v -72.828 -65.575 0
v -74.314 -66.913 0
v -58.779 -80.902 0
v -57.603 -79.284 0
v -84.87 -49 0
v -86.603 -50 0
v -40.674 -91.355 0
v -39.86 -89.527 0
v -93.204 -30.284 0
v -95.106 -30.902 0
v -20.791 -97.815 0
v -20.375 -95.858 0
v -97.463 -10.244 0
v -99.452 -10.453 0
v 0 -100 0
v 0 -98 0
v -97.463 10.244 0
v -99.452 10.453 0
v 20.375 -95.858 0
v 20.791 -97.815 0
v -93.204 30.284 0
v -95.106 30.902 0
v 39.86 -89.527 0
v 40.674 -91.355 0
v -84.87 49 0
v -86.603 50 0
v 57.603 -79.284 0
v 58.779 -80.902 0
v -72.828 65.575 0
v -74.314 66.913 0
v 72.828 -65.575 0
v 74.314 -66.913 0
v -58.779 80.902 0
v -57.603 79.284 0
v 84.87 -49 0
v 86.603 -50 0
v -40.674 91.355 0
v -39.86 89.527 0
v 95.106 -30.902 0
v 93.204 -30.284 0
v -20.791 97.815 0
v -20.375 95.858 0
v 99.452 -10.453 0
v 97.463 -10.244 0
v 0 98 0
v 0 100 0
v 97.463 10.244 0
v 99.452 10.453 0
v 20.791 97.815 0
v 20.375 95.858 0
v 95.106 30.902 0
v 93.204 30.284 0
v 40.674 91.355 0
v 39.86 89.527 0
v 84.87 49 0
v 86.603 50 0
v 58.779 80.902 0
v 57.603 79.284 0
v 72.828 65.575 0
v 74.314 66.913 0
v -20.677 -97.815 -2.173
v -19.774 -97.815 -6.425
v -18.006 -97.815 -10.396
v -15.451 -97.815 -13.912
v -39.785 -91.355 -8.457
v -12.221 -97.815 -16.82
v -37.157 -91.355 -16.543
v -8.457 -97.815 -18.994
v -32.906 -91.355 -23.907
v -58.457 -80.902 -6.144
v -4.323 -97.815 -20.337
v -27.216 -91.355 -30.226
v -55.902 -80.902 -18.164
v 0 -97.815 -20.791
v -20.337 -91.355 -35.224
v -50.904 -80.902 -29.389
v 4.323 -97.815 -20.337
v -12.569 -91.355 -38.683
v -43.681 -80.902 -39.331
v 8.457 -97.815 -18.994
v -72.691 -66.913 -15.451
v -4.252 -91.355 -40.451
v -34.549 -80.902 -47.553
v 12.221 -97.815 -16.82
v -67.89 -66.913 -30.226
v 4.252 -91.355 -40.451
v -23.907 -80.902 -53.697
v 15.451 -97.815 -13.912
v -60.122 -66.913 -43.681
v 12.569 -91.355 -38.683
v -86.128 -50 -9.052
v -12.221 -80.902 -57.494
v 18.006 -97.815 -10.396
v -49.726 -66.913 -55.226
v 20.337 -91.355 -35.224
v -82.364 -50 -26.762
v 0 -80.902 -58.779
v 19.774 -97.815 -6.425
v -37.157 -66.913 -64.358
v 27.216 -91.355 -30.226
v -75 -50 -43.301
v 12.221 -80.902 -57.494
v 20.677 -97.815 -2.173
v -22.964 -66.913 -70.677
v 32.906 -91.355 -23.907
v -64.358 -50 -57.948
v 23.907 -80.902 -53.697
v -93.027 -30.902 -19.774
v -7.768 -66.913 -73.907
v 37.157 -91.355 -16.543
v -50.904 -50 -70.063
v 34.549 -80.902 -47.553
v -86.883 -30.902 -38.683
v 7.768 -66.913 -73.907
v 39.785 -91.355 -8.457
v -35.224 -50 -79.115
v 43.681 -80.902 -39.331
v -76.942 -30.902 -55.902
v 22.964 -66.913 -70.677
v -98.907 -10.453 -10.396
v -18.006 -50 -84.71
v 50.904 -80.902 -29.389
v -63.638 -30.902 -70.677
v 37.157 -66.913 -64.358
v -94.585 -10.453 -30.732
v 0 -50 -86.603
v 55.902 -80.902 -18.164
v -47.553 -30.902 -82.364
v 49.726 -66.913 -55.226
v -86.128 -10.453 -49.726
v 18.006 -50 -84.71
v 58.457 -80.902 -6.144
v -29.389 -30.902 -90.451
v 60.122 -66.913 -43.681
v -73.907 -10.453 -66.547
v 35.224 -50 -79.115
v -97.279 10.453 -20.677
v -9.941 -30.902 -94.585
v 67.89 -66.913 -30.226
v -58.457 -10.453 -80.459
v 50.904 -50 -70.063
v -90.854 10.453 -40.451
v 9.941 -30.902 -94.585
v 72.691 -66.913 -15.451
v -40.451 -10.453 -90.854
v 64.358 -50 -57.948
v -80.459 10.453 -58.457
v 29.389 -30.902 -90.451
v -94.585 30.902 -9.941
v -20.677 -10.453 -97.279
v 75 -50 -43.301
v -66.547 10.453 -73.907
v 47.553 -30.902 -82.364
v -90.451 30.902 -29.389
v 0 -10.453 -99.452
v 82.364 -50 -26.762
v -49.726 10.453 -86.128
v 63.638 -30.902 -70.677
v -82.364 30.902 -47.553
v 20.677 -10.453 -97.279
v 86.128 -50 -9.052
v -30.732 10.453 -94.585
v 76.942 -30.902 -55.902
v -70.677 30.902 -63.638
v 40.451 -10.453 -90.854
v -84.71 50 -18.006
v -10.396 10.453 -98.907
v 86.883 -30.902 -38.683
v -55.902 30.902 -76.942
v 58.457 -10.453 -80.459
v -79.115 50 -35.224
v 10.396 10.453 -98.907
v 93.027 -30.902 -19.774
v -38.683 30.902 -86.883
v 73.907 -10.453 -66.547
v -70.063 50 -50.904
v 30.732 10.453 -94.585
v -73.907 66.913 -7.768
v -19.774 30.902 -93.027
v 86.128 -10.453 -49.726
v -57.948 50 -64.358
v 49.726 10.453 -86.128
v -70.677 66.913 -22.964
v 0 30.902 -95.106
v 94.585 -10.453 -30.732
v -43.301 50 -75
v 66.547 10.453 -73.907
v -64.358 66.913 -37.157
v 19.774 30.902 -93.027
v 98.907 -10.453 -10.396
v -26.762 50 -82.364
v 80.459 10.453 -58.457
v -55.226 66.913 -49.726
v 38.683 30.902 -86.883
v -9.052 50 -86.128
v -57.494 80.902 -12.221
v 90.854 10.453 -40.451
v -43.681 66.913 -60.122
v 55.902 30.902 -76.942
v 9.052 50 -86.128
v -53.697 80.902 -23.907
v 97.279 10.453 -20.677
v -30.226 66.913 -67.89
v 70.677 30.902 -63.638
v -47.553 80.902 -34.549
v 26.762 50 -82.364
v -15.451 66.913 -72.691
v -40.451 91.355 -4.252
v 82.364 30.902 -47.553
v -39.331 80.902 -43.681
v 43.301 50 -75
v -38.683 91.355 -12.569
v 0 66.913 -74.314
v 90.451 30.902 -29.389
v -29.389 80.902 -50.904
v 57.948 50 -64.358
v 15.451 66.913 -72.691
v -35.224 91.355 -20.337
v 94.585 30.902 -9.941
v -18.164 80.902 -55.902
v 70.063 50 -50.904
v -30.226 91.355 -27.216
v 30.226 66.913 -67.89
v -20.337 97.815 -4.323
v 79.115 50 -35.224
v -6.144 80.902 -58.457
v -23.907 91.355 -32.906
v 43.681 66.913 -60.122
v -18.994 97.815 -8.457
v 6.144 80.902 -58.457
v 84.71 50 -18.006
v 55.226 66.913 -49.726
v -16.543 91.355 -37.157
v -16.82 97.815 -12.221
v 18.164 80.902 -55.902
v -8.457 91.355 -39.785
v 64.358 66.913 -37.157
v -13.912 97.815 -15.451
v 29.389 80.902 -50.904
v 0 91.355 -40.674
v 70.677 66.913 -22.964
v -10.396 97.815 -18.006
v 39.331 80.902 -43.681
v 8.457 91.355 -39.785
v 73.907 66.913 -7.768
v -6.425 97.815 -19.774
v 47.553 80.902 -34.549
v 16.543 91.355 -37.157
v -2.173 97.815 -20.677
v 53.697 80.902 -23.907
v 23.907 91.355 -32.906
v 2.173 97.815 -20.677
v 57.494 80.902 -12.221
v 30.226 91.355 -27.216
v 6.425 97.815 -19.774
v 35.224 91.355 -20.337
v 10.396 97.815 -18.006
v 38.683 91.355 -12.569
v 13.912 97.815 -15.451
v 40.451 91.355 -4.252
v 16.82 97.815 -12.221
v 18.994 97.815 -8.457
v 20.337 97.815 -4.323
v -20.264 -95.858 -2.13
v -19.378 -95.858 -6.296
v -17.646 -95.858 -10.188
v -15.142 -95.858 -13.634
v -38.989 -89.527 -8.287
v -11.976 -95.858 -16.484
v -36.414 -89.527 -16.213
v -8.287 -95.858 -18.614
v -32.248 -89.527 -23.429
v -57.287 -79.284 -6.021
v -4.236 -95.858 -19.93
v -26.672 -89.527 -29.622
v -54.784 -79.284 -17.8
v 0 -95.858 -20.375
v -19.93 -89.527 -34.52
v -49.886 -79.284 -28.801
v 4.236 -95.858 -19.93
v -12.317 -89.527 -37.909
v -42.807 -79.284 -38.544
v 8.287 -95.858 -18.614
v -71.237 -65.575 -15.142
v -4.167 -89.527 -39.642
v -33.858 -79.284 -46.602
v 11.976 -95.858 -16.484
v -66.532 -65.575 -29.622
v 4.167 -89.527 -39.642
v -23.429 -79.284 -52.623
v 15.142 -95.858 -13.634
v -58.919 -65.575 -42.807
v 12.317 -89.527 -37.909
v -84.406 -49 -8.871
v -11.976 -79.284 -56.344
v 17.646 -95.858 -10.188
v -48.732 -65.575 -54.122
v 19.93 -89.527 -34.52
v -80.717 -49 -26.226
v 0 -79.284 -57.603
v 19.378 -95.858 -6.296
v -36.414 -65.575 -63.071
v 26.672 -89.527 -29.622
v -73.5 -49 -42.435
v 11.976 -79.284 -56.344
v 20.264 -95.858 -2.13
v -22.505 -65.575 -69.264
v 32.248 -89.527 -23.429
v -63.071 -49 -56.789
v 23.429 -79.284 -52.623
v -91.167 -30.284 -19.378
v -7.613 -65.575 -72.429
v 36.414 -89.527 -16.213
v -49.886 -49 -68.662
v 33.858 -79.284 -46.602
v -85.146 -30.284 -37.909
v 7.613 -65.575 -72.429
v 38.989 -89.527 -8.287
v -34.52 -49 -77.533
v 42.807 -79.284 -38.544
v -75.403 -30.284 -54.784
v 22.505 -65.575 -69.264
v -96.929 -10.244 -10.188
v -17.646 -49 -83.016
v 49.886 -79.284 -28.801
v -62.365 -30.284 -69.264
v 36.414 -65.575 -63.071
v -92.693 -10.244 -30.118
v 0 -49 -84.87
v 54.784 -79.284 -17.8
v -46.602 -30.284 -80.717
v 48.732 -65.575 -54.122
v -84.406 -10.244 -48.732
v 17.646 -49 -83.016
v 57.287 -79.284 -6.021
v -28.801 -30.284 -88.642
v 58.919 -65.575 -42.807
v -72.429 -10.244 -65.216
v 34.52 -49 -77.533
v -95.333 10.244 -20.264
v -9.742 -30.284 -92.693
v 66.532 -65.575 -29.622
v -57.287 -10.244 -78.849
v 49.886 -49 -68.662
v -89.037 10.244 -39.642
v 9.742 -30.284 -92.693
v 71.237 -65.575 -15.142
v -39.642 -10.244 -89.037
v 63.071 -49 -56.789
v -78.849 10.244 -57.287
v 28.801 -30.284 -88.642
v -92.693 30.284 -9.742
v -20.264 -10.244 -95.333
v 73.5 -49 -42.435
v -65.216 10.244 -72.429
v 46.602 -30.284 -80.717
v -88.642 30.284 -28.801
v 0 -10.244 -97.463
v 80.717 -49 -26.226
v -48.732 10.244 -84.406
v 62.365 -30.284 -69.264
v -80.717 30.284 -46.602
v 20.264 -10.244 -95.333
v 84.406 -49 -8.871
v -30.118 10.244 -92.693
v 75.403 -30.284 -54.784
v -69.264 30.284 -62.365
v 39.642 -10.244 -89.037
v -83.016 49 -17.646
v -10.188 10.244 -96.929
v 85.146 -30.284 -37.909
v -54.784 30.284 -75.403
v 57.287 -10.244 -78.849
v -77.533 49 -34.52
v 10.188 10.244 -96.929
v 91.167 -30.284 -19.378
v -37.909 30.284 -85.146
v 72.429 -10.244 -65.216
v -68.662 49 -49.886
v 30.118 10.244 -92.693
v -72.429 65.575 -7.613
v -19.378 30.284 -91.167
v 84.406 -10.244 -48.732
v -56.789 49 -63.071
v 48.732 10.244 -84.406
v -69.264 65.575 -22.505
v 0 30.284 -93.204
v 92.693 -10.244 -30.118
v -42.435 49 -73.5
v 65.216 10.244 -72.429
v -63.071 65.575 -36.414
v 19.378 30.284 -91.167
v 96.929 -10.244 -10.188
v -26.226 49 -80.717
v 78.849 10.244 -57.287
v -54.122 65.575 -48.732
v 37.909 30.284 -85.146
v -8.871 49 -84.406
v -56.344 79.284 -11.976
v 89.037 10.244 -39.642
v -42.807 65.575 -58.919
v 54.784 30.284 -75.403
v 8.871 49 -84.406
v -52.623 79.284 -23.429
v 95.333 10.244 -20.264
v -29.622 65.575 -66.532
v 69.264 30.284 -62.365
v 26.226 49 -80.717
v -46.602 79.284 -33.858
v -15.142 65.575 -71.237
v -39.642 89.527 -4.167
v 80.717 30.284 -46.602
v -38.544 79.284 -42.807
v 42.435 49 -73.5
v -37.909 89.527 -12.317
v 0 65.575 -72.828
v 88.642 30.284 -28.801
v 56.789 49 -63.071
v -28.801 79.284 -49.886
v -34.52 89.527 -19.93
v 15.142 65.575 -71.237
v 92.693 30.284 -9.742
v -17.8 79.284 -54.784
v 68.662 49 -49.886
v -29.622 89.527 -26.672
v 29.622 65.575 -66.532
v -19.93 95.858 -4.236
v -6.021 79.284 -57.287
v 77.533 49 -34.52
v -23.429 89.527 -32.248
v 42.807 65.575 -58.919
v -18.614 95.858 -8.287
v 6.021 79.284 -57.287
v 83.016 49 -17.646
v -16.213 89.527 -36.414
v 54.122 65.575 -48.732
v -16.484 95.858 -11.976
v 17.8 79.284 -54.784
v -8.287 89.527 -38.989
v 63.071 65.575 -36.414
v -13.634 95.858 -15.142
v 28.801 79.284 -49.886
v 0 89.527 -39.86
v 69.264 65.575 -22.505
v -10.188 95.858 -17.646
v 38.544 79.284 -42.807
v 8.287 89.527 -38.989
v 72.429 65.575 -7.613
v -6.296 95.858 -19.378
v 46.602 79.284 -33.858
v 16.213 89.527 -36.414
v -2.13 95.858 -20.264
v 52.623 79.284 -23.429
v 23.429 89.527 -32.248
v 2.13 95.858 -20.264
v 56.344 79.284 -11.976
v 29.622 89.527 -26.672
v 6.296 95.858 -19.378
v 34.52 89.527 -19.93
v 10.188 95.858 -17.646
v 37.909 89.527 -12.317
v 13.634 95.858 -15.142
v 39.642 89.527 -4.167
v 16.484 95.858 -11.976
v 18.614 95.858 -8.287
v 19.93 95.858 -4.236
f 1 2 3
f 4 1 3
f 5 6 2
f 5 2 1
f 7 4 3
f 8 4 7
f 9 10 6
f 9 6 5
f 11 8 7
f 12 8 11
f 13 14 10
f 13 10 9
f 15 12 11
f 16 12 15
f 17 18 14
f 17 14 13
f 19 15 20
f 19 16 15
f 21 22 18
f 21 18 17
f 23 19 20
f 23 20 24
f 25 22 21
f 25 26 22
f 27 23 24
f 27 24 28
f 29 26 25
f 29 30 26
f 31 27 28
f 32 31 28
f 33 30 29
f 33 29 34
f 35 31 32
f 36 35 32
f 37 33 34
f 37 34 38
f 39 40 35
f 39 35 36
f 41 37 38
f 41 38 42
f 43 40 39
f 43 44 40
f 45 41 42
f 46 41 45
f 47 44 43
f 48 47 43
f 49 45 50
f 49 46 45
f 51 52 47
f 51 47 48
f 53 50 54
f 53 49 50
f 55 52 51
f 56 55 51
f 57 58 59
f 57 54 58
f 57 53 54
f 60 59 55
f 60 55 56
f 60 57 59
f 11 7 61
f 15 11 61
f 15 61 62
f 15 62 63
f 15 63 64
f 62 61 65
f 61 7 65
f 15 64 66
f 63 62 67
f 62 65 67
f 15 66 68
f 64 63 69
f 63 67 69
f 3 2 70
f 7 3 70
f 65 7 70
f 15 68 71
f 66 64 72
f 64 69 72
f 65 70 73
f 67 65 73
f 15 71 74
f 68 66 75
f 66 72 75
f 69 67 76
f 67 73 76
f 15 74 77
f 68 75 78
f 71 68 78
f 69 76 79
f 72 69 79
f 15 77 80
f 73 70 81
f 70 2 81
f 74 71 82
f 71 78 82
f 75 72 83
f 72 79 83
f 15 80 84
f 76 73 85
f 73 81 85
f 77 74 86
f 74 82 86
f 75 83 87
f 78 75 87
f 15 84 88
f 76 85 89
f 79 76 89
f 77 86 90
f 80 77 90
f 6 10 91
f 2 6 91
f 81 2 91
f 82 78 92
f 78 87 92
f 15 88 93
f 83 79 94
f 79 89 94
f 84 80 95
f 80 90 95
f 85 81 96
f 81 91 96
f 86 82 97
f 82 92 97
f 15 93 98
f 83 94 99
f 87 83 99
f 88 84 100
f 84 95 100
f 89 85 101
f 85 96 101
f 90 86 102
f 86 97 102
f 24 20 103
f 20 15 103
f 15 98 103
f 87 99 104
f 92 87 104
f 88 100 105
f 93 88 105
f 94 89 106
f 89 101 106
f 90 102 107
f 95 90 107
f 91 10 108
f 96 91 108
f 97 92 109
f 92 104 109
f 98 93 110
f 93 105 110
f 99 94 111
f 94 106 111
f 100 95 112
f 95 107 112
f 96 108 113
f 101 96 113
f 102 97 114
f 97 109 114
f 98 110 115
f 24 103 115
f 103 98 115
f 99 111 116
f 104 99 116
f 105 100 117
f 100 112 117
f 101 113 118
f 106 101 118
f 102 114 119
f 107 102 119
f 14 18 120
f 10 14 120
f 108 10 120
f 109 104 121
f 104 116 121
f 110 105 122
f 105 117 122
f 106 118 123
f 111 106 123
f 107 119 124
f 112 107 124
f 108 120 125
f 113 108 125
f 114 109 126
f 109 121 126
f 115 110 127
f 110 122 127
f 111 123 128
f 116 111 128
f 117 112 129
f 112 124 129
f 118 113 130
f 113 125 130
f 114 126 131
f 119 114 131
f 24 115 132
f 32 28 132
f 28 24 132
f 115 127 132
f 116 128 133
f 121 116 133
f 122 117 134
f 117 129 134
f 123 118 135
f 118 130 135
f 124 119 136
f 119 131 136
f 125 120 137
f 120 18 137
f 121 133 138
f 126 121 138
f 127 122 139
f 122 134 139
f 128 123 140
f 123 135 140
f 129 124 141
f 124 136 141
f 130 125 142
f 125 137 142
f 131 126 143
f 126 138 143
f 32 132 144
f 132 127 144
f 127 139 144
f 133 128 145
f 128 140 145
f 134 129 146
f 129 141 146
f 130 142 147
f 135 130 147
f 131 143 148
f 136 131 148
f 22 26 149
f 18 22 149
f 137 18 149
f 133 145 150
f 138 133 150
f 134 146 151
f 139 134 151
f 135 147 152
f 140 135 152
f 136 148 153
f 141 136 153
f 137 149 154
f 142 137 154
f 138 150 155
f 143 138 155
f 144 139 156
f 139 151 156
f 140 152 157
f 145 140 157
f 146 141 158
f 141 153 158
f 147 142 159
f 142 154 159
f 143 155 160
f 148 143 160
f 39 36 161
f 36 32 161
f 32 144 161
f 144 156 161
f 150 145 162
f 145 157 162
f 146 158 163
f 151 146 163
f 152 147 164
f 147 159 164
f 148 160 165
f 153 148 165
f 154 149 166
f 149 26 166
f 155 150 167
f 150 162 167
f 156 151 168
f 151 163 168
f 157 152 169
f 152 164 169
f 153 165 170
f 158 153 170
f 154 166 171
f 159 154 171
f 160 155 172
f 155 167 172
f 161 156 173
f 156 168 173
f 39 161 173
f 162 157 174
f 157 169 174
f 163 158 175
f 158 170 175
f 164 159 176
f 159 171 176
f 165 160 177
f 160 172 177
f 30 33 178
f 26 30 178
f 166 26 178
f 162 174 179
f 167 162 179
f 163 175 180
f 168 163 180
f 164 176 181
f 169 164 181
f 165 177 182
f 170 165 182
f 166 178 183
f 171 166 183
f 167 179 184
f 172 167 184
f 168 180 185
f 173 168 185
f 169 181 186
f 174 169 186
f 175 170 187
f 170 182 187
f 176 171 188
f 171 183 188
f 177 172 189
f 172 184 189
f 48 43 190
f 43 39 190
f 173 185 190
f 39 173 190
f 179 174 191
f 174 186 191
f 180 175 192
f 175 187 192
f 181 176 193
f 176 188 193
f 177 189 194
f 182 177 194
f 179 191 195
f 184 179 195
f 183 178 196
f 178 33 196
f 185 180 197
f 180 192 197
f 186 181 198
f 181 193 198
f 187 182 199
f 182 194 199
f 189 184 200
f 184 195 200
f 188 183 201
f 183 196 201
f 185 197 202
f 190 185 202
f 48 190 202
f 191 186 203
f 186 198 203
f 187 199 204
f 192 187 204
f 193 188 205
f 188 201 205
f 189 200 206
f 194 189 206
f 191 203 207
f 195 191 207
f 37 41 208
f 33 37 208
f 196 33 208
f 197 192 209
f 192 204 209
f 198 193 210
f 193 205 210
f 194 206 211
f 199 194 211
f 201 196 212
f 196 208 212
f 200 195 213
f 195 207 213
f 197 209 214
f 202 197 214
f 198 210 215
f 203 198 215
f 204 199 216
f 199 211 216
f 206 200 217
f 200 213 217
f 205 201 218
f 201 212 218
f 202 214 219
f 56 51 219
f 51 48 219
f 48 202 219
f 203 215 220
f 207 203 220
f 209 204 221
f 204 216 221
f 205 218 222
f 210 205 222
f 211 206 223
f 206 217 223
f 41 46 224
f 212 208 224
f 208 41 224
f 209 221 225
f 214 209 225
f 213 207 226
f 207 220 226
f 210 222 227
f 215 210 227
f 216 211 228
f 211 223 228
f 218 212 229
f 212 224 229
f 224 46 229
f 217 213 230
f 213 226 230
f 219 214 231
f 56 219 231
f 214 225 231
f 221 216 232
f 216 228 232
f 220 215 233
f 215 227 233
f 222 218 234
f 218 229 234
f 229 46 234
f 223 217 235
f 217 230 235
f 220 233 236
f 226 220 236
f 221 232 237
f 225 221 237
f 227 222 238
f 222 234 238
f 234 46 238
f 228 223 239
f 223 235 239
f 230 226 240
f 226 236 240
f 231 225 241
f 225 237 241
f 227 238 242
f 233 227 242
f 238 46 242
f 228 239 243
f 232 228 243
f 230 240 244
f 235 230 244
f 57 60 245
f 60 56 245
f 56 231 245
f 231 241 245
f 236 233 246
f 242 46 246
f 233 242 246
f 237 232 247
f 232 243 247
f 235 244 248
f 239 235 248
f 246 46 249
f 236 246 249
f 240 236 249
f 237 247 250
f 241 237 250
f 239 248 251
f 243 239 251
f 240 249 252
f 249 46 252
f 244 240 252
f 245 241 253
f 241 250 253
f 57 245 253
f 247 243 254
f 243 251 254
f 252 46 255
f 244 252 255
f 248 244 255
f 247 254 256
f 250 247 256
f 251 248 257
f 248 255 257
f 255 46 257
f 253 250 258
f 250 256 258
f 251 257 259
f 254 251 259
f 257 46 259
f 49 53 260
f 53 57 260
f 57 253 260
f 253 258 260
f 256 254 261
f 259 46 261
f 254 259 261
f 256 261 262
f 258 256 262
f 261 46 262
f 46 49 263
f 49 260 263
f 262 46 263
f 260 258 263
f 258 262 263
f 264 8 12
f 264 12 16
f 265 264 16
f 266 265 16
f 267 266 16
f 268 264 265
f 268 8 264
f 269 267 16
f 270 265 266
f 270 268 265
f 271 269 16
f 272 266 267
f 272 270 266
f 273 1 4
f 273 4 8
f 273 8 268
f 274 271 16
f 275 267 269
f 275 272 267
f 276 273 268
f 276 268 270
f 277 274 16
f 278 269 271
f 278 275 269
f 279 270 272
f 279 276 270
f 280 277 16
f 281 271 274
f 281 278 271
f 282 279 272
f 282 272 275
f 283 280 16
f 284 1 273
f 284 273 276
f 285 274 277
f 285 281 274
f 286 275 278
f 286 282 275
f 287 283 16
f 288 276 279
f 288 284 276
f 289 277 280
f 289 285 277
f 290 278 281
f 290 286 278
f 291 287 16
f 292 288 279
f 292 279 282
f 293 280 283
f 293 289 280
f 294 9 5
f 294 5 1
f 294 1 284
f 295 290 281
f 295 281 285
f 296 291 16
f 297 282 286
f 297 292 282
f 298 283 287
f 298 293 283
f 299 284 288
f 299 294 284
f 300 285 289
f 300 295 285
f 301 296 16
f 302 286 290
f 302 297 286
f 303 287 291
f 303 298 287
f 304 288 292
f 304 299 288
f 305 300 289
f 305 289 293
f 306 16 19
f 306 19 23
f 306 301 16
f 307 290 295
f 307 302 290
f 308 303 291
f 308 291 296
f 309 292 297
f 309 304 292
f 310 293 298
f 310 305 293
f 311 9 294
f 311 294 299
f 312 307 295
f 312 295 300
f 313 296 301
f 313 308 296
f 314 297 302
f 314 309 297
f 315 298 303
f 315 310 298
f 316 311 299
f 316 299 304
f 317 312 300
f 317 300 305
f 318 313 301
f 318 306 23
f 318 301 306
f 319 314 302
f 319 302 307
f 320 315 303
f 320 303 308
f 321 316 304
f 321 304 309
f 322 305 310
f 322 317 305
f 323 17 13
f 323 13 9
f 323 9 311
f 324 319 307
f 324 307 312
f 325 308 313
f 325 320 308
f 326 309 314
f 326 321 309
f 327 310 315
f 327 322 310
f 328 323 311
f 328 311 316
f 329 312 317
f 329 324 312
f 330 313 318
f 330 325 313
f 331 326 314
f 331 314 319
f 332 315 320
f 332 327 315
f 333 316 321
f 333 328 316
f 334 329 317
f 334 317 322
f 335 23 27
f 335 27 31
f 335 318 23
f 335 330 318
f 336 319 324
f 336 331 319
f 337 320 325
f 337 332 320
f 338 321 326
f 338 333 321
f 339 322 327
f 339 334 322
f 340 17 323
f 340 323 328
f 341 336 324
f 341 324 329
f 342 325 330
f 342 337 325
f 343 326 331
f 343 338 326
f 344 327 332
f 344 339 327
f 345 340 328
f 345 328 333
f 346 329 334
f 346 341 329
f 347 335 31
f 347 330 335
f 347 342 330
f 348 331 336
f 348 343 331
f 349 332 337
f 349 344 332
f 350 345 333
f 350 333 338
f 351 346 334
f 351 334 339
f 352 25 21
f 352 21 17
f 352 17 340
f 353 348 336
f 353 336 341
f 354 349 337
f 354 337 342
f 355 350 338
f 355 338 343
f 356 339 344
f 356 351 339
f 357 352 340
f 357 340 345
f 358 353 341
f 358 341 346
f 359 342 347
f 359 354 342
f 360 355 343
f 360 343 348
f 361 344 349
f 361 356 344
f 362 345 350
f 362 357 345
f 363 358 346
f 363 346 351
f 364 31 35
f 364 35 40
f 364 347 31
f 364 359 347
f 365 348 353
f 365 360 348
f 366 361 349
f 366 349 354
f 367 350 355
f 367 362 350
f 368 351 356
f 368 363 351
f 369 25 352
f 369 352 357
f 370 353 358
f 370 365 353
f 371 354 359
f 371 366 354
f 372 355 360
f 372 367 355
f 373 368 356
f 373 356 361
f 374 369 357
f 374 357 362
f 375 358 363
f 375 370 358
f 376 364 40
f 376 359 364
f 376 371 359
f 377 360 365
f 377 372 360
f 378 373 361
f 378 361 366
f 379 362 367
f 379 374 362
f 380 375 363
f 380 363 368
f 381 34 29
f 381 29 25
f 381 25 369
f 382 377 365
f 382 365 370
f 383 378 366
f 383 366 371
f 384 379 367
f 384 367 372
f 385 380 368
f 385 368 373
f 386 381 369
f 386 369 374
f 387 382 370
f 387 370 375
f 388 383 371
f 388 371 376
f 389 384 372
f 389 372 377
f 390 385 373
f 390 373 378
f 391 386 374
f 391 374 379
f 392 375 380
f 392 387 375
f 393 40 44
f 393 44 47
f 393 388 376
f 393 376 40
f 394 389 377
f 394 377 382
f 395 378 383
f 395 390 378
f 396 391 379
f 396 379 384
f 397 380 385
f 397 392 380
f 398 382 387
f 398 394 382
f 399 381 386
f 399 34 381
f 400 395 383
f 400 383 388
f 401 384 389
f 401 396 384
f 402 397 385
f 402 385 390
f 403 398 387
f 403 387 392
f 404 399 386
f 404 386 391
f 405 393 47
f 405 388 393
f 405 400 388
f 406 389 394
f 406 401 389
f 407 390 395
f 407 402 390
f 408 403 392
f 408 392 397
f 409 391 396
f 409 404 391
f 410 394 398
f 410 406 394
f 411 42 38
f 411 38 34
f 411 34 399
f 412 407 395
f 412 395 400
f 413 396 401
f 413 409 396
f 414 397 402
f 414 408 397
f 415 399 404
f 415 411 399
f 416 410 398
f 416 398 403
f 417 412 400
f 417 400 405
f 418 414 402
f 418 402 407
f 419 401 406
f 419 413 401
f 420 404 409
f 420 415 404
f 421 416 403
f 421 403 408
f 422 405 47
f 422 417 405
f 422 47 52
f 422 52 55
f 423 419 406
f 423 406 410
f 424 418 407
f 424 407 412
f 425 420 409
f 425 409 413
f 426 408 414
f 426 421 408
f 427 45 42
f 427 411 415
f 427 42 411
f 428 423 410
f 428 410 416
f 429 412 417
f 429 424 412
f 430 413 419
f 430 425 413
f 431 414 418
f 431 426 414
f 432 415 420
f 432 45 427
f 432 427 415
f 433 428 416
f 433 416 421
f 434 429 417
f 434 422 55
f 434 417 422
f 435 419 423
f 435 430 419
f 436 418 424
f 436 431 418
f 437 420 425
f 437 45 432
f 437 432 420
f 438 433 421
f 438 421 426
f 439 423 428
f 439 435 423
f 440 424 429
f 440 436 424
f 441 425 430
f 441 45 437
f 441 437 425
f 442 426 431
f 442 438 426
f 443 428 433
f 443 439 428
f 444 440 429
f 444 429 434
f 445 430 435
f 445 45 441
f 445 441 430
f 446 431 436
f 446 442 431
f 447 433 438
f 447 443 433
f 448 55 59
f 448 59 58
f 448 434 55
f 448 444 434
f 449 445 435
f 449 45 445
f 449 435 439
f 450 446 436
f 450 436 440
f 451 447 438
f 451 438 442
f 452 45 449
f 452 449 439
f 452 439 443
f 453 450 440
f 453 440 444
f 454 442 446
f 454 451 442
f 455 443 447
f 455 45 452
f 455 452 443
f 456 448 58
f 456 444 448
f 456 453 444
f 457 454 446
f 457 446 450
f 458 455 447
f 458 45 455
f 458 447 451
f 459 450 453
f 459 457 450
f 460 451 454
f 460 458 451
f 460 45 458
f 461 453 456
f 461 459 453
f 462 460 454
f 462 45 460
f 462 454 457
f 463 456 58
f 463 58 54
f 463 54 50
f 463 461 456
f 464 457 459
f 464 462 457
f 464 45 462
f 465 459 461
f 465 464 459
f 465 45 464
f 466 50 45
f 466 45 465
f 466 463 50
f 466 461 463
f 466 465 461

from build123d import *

# Parameters (mm, degrees)
SKETCH_2_R          = 100
CUT_EXTRUDE_1_DEPTH = 101


with BuildPart() as part:
    # 草图1 → 旋转7 (revolve)
    with BuildSketch(Plane.XY):
        with BuildLine():
            Line((0, 100), (0, -100))
            ThreePointArc((0, -100), (100, 0), (0, 100))
        make_face()
    revolve(axis=Axis((0, 100, 0), (0, -1, 0)))

    # 草图3 → 切除-旋转1 (revolve, cut)
    with BuildSketch(Plane.XY):
        with BuildLine():
            Line((0, 98), (0, -98))
            ThreePointArc((0, -98), (98, 0), (0, 98))
        make_face()
    revolve(axis=Axis((0, 98, 0), (0, -1, 0)), mode=Mode.SUBTRACT)

    # 草图2 → 切除-拉伸1 (cut, through all)
    with BuildSketch(Plane.XY):
        Circle(SKETCH_2_R)
    extrude(amount=CUT_EXTRUDE_1_DEPTH, mode=Mode.SUBTRACT)


solid = part.part
